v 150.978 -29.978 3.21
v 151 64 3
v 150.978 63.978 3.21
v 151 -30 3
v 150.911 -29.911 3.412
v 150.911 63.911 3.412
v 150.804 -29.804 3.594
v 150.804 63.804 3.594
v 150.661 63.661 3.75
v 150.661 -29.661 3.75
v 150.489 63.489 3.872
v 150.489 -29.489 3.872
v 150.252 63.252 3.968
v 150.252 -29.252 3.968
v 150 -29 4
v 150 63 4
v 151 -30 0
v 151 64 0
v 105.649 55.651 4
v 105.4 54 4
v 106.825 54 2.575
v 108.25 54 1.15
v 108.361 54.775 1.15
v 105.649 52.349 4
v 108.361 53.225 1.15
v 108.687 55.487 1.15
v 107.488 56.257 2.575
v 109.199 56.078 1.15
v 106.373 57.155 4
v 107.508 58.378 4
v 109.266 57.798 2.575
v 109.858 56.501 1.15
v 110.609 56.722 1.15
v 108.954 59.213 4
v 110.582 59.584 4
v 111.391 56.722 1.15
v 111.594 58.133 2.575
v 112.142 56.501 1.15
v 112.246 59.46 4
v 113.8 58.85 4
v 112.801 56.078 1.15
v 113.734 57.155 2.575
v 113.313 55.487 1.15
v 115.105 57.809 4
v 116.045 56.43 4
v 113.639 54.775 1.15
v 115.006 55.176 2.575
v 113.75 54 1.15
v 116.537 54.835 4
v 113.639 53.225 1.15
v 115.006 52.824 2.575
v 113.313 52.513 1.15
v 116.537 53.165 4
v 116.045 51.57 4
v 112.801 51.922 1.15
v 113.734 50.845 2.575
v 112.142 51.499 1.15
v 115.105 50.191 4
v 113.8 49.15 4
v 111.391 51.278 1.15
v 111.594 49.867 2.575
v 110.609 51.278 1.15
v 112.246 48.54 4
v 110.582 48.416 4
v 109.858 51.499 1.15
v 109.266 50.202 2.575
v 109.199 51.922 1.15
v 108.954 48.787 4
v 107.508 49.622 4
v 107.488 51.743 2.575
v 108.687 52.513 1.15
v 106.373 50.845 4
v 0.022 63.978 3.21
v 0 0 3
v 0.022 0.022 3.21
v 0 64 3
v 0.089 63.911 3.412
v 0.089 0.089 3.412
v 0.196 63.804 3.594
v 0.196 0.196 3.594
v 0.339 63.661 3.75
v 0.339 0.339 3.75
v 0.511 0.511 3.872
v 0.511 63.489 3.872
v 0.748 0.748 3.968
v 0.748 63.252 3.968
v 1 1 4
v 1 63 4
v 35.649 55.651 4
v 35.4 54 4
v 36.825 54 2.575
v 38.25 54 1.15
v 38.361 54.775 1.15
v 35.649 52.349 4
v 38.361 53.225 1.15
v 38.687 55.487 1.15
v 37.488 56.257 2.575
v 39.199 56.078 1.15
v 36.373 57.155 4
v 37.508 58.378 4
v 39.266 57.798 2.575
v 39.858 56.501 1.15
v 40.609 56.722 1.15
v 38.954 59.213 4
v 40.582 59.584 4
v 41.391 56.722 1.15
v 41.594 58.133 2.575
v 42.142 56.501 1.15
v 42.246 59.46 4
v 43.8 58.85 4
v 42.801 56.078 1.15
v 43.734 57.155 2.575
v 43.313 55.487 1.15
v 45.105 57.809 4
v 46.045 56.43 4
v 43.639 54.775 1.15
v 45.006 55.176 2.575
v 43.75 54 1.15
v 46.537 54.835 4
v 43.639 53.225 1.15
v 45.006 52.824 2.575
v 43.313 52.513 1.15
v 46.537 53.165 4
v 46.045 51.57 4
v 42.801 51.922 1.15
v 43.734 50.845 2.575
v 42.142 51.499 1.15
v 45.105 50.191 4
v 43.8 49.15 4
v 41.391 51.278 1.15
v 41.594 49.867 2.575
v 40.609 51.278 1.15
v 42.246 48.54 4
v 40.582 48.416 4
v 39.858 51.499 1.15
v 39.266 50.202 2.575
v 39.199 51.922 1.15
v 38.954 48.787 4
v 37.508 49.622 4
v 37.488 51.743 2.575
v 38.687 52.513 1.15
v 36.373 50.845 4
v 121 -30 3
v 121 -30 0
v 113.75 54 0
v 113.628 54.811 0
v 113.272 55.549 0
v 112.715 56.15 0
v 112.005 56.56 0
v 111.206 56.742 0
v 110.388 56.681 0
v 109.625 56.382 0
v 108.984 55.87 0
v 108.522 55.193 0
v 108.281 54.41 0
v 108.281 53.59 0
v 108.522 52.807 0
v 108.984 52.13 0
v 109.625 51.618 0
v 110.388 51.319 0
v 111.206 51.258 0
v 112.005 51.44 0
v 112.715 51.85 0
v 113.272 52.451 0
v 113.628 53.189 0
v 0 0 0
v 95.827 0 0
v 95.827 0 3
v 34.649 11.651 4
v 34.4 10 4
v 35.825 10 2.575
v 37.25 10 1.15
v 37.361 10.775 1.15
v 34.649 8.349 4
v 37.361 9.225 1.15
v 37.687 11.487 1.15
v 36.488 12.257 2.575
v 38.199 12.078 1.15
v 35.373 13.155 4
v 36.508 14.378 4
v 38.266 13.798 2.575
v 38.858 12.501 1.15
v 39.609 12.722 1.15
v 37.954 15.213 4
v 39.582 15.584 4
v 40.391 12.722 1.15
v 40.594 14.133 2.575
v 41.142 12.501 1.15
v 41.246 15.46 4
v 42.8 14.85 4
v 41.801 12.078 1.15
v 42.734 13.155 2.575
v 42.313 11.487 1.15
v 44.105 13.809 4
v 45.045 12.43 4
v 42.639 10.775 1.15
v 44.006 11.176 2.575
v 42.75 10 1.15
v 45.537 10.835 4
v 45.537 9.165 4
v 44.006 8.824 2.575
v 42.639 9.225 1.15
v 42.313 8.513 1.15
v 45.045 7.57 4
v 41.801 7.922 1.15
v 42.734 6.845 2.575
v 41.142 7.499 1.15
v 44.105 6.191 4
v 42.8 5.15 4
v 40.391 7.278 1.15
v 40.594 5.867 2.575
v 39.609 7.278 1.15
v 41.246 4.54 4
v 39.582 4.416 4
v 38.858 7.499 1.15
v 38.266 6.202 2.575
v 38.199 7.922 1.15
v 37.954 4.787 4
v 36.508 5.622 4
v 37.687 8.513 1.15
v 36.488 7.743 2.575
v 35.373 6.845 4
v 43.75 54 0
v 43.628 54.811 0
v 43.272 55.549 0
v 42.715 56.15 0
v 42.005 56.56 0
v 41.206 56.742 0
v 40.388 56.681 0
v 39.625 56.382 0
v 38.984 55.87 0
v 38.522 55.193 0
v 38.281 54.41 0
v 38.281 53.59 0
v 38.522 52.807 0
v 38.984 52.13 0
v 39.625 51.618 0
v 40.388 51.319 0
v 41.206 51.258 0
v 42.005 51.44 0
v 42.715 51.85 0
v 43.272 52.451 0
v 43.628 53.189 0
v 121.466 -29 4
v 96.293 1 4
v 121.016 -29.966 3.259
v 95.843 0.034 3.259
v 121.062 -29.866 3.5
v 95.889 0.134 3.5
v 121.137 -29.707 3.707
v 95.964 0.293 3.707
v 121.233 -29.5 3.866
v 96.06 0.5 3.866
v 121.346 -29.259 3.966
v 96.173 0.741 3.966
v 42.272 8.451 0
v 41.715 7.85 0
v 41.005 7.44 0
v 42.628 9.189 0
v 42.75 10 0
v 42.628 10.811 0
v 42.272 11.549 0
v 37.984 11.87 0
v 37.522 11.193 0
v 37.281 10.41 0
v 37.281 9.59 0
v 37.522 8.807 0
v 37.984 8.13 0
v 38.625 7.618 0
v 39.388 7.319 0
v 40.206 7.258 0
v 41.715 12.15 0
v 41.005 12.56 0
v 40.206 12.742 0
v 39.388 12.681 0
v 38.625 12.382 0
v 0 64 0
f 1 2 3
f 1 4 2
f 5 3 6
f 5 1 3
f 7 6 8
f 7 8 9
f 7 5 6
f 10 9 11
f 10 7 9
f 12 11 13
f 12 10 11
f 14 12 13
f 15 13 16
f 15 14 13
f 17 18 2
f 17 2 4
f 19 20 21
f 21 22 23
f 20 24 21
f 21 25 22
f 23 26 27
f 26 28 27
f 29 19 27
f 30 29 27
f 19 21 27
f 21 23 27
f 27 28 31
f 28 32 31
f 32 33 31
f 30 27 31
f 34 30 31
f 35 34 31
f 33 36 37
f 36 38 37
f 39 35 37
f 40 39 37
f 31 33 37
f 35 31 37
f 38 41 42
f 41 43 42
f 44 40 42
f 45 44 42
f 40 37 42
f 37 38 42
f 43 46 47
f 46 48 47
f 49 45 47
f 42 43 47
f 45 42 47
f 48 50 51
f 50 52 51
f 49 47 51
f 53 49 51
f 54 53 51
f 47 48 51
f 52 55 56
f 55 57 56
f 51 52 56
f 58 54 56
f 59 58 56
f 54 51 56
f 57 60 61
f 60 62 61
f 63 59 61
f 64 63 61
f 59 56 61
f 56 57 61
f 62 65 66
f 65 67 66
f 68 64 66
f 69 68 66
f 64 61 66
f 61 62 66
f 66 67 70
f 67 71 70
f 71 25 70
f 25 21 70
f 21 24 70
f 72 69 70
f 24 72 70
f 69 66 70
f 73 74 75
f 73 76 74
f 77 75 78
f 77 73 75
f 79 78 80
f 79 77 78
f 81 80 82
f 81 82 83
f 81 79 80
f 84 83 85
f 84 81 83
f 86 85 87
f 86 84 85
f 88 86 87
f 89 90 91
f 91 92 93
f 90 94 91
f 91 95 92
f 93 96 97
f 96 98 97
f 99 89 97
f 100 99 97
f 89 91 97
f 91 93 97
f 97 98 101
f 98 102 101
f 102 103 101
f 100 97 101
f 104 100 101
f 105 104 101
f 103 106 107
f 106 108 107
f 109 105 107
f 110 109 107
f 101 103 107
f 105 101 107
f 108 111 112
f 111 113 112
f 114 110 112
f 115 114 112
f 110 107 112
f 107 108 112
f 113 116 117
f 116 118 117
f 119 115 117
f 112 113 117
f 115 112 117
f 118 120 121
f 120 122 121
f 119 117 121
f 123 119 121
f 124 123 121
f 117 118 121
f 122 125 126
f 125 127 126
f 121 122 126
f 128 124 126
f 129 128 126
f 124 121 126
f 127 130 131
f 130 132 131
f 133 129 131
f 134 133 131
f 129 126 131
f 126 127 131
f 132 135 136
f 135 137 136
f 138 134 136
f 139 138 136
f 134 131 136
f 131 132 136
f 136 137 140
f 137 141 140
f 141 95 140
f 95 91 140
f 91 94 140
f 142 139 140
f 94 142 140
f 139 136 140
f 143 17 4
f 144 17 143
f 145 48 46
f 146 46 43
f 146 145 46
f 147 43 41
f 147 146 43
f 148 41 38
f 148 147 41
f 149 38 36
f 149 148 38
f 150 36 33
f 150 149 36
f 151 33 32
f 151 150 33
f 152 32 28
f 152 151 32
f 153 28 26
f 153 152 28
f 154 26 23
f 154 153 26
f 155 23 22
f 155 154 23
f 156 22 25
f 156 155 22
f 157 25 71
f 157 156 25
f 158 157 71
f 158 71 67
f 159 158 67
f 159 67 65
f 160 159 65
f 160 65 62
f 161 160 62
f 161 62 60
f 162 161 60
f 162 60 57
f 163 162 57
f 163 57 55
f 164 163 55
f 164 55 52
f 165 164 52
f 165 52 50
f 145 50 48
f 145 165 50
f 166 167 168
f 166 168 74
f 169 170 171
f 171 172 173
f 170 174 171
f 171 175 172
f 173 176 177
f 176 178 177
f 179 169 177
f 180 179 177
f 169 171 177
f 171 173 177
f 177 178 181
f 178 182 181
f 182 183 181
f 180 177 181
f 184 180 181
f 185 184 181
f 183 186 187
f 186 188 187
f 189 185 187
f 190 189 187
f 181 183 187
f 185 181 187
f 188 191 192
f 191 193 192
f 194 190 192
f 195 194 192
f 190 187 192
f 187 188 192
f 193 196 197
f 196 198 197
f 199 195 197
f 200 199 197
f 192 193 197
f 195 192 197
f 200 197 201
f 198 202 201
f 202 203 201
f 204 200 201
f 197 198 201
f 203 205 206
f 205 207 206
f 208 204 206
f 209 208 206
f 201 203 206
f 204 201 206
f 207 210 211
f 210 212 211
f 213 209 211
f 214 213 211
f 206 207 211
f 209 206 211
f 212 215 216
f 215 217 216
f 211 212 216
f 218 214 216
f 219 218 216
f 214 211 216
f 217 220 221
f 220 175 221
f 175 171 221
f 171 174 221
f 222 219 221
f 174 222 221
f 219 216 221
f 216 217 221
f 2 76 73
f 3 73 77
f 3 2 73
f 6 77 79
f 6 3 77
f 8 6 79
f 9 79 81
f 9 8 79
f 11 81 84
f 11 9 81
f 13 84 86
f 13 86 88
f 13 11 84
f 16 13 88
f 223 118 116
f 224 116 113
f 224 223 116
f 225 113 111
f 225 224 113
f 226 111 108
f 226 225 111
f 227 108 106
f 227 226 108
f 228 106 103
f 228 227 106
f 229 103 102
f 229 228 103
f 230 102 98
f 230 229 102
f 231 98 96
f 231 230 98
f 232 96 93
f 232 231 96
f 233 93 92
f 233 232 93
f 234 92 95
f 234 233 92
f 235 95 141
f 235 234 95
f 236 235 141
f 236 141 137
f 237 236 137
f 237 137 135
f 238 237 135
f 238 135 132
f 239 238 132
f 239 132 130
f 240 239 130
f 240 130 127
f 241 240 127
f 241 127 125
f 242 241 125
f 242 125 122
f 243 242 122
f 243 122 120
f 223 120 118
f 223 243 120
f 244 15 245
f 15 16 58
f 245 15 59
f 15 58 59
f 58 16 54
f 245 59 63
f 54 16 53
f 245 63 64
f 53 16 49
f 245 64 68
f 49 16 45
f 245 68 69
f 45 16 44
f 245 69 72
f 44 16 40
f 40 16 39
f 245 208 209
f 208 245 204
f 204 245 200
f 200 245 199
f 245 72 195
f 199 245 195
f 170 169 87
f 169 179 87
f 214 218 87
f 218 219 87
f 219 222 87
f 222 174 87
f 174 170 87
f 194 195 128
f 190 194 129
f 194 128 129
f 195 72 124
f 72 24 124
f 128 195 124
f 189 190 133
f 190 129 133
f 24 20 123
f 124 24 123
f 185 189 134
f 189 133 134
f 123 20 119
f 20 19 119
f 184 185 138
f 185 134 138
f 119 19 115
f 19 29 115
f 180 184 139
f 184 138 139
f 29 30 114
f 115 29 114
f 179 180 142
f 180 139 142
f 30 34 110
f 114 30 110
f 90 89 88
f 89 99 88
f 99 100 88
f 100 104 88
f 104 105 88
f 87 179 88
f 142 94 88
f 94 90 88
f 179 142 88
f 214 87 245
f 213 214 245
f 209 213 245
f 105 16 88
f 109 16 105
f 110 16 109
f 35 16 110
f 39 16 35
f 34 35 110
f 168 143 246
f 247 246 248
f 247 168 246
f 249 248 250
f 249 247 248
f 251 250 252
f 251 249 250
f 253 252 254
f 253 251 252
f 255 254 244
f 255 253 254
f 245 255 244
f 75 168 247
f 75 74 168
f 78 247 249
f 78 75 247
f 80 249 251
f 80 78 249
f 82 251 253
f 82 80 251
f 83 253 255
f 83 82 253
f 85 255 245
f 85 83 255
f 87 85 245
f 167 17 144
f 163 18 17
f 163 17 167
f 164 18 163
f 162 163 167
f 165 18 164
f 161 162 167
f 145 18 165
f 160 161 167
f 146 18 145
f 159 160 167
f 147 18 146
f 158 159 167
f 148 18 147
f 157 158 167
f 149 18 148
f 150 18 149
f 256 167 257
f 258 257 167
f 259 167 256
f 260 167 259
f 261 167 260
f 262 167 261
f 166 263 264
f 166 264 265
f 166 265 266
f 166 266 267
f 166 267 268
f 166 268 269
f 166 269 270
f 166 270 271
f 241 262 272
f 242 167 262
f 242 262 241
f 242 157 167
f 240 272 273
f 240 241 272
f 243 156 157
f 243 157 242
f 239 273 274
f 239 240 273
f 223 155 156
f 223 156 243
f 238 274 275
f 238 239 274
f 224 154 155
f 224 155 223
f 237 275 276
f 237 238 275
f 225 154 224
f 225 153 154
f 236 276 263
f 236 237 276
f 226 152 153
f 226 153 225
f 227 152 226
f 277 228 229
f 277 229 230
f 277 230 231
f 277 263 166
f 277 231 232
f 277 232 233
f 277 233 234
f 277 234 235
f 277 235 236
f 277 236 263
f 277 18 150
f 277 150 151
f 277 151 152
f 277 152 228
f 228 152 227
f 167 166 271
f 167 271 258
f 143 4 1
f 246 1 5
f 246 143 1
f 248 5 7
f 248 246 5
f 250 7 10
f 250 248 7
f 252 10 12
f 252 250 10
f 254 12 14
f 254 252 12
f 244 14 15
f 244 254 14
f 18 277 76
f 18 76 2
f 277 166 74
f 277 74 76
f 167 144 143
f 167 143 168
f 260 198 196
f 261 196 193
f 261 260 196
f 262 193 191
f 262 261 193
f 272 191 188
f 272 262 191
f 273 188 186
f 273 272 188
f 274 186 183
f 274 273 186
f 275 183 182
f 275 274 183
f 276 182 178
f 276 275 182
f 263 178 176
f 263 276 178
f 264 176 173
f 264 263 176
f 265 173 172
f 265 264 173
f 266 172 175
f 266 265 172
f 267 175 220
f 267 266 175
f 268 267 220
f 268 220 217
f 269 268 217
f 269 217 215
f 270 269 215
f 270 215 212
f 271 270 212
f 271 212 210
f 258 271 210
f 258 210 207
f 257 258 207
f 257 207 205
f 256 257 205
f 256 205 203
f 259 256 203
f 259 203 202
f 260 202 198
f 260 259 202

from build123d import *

# Parameters (mm, degrees)
SKETCH1_R                                            = 2.75
BOSS_EXTRUDE1_DEPTH                                  = 4
FILLET1_R                                            = 1
CSK_FOR_M5_HEX_SOCKET_COUNTERSUNK_CAP_SC_D           = 5.5
CSK_FOR_M5_HEX_SOCKET_COUNTERSUNK_CAP_SC_DEPTH       = 12.4
CSK_FOR_M5_HEX_SOCKET_COUNTERSUNK_CAP_SC_CSINK_D     = 11.2
CSK_FOR_M5_HEX_SOCKET_COUNTERSUNK_CAP_SC_CSINK_ANGLE = 90
CSK_FOR_M5_HEX_SOCKET_COUNTERSUNK_CAP_SC_TIP         = 1.652366702


with BuildPart() as part:
    # Sketch1 → Boss-Extrude1 (new body)
    with BuildSketch(Plane.XY):
        Polygon((0, 0), (0, 64), (151, 64), (151, -30), (121, -30), (95.827011065, 0), align=None)
        with Locations((41, 54)):
            Circle(SKETCH1_R, mode=Mode.SUBTRACT)
        with Locations((111, 54)):
            Circle(SKETCH1_R, mode=Mode.SUBTRACT)
        with Locations((40, 10)):
            Circle(SKETCH1_R, mode=Mode.SUBTRACT)
    extrude(amount=BOSS_EXTRUDE1_DEPTH)

    # Fillet1
    fillet1_edges = [part.edges().sort_by_distance(p)[0] for p in [
        (136, -30, 4),
        (151, 17, 4),
        (75.5, 64, 4),
        (0, 32, 4),
        (47.913505532, 0, 4),
        (108.413505532, -15, 4),
    ]]
    fillet(fillet1_edges, radius=FILLET1_R)

    # CSK for M5 Hex Socket Countersunk Cap Screw1
    with Locations(Plane.XY.offset(4)):
        with Locations((41, 54), (111, 54), (40, 10)):
            CounterSinkHole(CSK_FOR_M5_HEX_SOCKET_COUNTERSUNK_CAP_SC_D / 2, CSK_FOR_M5_HEX_SOCKET_COUNTERSUNK_CAP_SC_CSINK_D / 2, depth=CSK_FOR_M5_HEX_SOCKET_COUNTERSUNK_CAP_SC_DEPTH, counter_sink_angle=CSK_FOR_M5_HEX_SOCKET_COUNTERSUNK_CAP_SC_CSINK_ANGLE)
            with Locations((0, 0, -(CSK_FOR_M5_HEX_SOCKET_COUNTERSUNK_CAP_SC_DEPTH + CSK_FOR_M5_HEX_SOCKET_COUNTERSUNK_CAP_SC_TIP / 2))):  # 118° drill point
                Cone(0, CSK_FOR_M5_HEX_SOCKET_COUNTERSUNK_CAP_SC_D / 2, CSK_FOR_M5_HEX_SOCKET_COUNTERSUNK_CAP_SC_TIP, mode=Mode.SUBTRACT)


solid = part.part
